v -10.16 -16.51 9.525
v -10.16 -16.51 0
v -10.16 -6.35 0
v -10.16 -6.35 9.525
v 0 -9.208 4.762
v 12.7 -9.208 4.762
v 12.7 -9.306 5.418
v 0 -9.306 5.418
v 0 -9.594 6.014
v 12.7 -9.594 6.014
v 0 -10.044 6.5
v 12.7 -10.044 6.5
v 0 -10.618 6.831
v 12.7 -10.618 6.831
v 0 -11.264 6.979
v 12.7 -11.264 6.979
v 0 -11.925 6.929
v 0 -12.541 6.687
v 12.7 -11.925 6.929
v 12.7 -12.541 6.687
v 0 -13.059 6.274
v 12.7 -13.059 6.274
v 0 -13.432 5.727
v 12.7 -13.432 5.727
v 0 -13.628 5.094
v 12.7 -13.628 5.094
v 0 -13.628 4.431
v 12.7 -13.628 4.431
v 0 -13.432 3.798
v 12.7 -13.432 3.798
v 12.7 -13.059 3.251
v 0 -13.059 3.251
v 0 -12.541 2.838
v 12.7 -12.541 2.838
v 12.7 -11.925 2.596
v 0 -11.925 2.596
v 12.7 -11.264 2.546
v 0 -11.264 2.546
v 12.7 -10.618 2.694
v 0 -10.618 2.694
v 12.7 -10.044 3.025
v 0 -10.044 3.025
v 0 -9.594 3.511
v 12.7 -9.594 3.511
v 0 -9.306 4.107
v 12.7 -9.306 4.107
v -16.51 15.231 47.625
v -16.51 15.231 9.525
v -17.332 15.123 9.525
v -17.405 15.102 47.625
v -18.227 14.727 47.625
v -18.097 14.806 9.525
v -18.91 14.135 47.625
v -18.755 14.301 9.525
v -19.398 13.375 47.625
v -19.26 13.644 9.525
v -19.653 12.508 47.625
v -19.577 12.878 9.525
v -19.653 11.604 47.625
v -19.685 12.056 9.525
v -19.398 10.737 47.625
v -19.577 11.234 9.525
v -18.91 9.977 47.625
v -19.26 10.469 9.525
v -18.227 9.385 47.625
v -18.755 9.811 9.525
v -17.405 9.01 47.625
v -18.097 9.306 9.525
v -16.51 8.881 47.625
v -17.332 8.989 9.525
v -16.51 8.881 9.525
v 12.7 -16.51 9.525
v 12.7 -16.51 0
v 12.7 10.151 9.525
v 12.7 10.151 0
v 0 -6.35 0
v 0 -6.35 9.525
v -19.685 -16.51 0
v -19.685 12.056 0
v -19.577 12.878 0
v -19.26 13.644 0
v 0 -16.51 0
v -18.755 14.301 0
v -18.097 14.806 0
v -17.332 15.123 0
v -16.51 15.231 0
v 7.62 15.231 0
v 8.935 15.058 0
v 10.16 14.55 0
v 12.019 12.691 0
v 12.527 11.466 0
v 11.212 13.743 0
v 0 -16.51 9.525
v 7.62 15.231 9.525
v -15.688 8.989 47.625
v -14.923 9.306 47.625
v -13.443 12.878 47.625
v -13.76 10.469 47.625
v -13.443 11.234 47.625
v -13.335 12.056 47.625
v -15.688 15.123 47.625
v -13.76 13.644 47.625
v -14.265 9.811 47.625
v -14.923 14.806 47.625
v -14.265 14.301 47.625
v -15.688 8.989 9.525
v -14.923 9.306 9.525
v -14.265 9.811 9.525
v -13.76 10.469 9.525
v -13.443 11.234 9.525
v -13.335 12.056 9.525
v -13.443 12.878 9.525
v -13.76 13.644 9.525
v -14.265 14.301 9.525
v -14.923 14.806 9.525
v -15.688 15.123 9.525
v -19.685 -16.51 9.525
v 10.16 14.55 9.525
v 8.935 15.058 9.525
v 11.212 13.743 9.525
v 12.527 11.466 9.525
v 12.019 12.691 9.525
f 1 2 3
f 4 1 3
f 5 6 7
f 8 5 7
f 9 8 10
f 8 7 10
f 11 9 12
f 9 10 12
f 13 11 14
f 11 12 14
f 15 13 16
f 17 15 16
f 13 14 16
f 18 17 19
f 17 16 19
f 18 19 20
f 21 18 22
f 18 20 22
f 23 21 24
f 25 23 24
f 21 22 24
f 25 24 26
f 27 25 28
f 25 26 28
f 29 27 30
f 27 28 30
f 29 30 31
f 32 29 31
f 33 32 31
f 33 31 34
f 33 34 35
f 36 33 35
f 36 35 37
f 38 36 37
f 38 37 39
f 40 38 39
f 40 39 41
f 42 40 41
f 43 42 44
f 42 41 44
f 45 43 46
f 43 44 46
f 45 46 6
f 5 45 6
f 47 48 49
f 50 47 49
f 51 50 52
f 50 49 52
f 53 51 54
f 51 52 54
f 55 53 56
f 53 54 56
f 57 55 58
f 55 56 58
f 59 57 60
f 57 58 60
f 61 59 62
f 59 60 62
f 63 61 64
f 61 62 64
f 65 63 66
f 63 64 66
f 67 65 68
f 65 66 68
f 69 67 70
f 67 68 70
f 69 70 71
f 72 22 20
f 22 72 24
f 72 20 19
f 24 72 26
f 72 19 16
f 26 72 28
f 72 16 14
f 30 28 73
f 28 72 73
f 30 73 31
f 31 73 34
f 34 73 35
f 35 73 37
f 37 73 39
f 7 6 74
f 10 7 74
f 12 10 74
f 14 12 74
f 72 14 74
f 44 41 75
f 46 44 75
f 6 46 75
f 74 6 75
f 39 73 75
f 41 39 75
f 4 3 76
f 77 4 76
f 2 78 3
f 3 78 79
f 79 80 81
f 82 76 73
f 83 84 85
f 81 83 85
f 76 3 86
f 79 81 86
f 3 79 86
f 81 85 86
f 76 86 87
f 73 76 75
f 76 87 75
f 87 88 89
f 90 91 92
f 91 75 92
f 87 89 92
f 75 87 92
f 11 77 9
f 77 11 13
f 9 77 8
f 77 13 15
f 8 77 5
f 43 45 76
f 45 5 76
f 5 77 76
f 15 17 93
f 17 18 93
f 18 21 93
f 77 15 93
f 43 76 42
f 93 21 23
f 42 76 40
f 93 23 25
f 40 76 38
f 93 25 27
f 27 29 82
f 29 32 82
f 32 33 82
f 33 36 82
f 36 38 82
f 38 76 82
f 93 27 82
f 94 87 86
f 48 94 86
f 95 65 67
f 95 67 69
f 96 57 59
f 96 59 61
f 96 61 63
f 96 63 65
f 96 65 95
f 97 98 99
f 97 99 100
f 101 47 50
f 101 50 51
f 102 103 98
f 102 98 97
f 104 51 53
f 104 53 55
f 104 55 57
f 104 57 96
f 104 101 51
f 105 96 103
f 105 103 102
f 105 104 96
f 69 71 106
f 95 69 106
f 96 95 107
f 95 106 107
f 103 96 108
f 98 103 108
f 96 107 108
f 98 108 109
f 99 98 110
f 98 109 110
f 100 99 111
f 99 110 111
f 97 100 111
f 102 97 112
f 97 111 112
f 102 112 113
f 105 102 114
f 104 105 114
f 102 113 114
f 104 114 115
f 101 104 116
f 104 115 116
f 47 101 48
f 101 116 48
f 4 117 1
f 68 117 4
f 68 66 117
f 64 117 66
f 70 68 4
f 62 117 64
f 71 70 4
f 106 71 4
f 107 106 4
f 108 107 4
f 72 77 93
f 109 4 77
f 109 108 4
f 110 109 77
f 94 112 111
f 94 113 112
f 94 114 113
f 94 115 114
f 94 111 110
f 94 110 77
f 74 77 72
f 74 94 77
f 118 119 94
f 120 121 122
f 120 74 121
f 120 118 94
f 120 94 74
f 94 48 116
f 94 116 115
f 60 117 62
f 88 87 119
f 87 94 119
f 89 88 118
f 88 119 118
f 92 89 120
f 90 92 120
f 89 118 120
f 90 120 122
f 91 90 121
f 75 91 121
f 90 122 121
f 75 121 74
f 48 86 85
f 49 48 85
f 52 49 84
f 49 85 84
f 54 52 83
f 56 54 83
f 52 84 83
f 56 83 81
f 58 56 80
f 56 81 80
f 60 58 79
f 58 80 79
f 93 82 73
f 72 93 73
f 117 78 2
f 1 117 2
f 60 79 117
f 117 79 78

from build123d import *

# Parameters (mm, degrees)
F1_DEPTH = 9.525
F3_DEPTH = 38.1
F4_R     = 2.2225
F5_DEPTH = 12.7
F6_R     = 5.08
F7_DEPTH = 9.525


with BuildPart() as f1:
    # F0 (on Top) → F1 (new body)
    with BuildSketch(Plane.XY):
        with BuildLine():
            Line((-10.16, -16.51), (-10.16, -6.35))
            Line((-10.16, -6.35), (0, -6.35))
            Line((0, -6.35), (0, -16.51))
            Line((0, -16.51), (12.7, -16.51))
            Line((12.7, -16.51), (12.7, -6.35))
            Line((12.7, -6.35), (12.7, 15.231052))
            Line((12.7, 15.231052), (-16.51, 15.231052))
            ThreePointArc((-16.51, 15.231052), (-18.755064, 14.301116), (-19.685, 12.056052))
            ThreePointArc((-19.685, 12.056052), (-18.755064, 9.810988), (-16.51, 8.881052))
            Line((-16.51, 8.881052), (-16.51, -16.51))
            Line((-16.51, -16.51), (-10.16, -16.51))
        make_face()
    extrude(amount=F1_DEPTH)

    # F2 (on face) → F3 (join)
    with BuildSketch(Plane.XY.offset(9.525)):
        with BuildLine():
            ThreePointArc((-16.51, 8.881052), (-14.264936, 9.810988), (-13.335, 12.056052))
            ThreePointArc((-13.335, 12.056052), (-14.264936, 14.301116), (-16.51, 15.231052))
            ThreePointArc((-16.51, 15.231052), (-19.685, 12.056052), (-16.51, 8.881052))
        make_face()
    extrude(amount=F3_DEPTH)

    # F4 (on face) → F5 (cut, through all)
    with BuildSketch(Plane.YZ.offset(12.7)):
        with Locations((-11.43, 4.7625)):
            Circle(F4_R)
    extrude(amount=-F5_DEPTH, mode=Mode.SUBTRACT)

    # F6
    f6_edges = [f1.edges().sort_by_distance(p)[0] for p in [
        (12.7, 15.231052, 4.7625),
    ]]
    fillet(f6_edges, radius=F6_R)

    # F0 (on Top) → F7 (join)
    with BuildSketch(Plane.XY):
        with BuildLine():
            Line((-19.685, -16.51), (-16.51, -16.51))
            Line((-16.51, -16.51), (-16.51, 8.881052))
            ThreePointArc((-16.51, 8.881052), (-18.755064, 9.810988), (-19.685, 12.056052))
            Line((-19.685, 12.056052), (-19.685, -16.51))
        make_face()
    extrude(amount=F7_DEPTH)


solid = f1.part
